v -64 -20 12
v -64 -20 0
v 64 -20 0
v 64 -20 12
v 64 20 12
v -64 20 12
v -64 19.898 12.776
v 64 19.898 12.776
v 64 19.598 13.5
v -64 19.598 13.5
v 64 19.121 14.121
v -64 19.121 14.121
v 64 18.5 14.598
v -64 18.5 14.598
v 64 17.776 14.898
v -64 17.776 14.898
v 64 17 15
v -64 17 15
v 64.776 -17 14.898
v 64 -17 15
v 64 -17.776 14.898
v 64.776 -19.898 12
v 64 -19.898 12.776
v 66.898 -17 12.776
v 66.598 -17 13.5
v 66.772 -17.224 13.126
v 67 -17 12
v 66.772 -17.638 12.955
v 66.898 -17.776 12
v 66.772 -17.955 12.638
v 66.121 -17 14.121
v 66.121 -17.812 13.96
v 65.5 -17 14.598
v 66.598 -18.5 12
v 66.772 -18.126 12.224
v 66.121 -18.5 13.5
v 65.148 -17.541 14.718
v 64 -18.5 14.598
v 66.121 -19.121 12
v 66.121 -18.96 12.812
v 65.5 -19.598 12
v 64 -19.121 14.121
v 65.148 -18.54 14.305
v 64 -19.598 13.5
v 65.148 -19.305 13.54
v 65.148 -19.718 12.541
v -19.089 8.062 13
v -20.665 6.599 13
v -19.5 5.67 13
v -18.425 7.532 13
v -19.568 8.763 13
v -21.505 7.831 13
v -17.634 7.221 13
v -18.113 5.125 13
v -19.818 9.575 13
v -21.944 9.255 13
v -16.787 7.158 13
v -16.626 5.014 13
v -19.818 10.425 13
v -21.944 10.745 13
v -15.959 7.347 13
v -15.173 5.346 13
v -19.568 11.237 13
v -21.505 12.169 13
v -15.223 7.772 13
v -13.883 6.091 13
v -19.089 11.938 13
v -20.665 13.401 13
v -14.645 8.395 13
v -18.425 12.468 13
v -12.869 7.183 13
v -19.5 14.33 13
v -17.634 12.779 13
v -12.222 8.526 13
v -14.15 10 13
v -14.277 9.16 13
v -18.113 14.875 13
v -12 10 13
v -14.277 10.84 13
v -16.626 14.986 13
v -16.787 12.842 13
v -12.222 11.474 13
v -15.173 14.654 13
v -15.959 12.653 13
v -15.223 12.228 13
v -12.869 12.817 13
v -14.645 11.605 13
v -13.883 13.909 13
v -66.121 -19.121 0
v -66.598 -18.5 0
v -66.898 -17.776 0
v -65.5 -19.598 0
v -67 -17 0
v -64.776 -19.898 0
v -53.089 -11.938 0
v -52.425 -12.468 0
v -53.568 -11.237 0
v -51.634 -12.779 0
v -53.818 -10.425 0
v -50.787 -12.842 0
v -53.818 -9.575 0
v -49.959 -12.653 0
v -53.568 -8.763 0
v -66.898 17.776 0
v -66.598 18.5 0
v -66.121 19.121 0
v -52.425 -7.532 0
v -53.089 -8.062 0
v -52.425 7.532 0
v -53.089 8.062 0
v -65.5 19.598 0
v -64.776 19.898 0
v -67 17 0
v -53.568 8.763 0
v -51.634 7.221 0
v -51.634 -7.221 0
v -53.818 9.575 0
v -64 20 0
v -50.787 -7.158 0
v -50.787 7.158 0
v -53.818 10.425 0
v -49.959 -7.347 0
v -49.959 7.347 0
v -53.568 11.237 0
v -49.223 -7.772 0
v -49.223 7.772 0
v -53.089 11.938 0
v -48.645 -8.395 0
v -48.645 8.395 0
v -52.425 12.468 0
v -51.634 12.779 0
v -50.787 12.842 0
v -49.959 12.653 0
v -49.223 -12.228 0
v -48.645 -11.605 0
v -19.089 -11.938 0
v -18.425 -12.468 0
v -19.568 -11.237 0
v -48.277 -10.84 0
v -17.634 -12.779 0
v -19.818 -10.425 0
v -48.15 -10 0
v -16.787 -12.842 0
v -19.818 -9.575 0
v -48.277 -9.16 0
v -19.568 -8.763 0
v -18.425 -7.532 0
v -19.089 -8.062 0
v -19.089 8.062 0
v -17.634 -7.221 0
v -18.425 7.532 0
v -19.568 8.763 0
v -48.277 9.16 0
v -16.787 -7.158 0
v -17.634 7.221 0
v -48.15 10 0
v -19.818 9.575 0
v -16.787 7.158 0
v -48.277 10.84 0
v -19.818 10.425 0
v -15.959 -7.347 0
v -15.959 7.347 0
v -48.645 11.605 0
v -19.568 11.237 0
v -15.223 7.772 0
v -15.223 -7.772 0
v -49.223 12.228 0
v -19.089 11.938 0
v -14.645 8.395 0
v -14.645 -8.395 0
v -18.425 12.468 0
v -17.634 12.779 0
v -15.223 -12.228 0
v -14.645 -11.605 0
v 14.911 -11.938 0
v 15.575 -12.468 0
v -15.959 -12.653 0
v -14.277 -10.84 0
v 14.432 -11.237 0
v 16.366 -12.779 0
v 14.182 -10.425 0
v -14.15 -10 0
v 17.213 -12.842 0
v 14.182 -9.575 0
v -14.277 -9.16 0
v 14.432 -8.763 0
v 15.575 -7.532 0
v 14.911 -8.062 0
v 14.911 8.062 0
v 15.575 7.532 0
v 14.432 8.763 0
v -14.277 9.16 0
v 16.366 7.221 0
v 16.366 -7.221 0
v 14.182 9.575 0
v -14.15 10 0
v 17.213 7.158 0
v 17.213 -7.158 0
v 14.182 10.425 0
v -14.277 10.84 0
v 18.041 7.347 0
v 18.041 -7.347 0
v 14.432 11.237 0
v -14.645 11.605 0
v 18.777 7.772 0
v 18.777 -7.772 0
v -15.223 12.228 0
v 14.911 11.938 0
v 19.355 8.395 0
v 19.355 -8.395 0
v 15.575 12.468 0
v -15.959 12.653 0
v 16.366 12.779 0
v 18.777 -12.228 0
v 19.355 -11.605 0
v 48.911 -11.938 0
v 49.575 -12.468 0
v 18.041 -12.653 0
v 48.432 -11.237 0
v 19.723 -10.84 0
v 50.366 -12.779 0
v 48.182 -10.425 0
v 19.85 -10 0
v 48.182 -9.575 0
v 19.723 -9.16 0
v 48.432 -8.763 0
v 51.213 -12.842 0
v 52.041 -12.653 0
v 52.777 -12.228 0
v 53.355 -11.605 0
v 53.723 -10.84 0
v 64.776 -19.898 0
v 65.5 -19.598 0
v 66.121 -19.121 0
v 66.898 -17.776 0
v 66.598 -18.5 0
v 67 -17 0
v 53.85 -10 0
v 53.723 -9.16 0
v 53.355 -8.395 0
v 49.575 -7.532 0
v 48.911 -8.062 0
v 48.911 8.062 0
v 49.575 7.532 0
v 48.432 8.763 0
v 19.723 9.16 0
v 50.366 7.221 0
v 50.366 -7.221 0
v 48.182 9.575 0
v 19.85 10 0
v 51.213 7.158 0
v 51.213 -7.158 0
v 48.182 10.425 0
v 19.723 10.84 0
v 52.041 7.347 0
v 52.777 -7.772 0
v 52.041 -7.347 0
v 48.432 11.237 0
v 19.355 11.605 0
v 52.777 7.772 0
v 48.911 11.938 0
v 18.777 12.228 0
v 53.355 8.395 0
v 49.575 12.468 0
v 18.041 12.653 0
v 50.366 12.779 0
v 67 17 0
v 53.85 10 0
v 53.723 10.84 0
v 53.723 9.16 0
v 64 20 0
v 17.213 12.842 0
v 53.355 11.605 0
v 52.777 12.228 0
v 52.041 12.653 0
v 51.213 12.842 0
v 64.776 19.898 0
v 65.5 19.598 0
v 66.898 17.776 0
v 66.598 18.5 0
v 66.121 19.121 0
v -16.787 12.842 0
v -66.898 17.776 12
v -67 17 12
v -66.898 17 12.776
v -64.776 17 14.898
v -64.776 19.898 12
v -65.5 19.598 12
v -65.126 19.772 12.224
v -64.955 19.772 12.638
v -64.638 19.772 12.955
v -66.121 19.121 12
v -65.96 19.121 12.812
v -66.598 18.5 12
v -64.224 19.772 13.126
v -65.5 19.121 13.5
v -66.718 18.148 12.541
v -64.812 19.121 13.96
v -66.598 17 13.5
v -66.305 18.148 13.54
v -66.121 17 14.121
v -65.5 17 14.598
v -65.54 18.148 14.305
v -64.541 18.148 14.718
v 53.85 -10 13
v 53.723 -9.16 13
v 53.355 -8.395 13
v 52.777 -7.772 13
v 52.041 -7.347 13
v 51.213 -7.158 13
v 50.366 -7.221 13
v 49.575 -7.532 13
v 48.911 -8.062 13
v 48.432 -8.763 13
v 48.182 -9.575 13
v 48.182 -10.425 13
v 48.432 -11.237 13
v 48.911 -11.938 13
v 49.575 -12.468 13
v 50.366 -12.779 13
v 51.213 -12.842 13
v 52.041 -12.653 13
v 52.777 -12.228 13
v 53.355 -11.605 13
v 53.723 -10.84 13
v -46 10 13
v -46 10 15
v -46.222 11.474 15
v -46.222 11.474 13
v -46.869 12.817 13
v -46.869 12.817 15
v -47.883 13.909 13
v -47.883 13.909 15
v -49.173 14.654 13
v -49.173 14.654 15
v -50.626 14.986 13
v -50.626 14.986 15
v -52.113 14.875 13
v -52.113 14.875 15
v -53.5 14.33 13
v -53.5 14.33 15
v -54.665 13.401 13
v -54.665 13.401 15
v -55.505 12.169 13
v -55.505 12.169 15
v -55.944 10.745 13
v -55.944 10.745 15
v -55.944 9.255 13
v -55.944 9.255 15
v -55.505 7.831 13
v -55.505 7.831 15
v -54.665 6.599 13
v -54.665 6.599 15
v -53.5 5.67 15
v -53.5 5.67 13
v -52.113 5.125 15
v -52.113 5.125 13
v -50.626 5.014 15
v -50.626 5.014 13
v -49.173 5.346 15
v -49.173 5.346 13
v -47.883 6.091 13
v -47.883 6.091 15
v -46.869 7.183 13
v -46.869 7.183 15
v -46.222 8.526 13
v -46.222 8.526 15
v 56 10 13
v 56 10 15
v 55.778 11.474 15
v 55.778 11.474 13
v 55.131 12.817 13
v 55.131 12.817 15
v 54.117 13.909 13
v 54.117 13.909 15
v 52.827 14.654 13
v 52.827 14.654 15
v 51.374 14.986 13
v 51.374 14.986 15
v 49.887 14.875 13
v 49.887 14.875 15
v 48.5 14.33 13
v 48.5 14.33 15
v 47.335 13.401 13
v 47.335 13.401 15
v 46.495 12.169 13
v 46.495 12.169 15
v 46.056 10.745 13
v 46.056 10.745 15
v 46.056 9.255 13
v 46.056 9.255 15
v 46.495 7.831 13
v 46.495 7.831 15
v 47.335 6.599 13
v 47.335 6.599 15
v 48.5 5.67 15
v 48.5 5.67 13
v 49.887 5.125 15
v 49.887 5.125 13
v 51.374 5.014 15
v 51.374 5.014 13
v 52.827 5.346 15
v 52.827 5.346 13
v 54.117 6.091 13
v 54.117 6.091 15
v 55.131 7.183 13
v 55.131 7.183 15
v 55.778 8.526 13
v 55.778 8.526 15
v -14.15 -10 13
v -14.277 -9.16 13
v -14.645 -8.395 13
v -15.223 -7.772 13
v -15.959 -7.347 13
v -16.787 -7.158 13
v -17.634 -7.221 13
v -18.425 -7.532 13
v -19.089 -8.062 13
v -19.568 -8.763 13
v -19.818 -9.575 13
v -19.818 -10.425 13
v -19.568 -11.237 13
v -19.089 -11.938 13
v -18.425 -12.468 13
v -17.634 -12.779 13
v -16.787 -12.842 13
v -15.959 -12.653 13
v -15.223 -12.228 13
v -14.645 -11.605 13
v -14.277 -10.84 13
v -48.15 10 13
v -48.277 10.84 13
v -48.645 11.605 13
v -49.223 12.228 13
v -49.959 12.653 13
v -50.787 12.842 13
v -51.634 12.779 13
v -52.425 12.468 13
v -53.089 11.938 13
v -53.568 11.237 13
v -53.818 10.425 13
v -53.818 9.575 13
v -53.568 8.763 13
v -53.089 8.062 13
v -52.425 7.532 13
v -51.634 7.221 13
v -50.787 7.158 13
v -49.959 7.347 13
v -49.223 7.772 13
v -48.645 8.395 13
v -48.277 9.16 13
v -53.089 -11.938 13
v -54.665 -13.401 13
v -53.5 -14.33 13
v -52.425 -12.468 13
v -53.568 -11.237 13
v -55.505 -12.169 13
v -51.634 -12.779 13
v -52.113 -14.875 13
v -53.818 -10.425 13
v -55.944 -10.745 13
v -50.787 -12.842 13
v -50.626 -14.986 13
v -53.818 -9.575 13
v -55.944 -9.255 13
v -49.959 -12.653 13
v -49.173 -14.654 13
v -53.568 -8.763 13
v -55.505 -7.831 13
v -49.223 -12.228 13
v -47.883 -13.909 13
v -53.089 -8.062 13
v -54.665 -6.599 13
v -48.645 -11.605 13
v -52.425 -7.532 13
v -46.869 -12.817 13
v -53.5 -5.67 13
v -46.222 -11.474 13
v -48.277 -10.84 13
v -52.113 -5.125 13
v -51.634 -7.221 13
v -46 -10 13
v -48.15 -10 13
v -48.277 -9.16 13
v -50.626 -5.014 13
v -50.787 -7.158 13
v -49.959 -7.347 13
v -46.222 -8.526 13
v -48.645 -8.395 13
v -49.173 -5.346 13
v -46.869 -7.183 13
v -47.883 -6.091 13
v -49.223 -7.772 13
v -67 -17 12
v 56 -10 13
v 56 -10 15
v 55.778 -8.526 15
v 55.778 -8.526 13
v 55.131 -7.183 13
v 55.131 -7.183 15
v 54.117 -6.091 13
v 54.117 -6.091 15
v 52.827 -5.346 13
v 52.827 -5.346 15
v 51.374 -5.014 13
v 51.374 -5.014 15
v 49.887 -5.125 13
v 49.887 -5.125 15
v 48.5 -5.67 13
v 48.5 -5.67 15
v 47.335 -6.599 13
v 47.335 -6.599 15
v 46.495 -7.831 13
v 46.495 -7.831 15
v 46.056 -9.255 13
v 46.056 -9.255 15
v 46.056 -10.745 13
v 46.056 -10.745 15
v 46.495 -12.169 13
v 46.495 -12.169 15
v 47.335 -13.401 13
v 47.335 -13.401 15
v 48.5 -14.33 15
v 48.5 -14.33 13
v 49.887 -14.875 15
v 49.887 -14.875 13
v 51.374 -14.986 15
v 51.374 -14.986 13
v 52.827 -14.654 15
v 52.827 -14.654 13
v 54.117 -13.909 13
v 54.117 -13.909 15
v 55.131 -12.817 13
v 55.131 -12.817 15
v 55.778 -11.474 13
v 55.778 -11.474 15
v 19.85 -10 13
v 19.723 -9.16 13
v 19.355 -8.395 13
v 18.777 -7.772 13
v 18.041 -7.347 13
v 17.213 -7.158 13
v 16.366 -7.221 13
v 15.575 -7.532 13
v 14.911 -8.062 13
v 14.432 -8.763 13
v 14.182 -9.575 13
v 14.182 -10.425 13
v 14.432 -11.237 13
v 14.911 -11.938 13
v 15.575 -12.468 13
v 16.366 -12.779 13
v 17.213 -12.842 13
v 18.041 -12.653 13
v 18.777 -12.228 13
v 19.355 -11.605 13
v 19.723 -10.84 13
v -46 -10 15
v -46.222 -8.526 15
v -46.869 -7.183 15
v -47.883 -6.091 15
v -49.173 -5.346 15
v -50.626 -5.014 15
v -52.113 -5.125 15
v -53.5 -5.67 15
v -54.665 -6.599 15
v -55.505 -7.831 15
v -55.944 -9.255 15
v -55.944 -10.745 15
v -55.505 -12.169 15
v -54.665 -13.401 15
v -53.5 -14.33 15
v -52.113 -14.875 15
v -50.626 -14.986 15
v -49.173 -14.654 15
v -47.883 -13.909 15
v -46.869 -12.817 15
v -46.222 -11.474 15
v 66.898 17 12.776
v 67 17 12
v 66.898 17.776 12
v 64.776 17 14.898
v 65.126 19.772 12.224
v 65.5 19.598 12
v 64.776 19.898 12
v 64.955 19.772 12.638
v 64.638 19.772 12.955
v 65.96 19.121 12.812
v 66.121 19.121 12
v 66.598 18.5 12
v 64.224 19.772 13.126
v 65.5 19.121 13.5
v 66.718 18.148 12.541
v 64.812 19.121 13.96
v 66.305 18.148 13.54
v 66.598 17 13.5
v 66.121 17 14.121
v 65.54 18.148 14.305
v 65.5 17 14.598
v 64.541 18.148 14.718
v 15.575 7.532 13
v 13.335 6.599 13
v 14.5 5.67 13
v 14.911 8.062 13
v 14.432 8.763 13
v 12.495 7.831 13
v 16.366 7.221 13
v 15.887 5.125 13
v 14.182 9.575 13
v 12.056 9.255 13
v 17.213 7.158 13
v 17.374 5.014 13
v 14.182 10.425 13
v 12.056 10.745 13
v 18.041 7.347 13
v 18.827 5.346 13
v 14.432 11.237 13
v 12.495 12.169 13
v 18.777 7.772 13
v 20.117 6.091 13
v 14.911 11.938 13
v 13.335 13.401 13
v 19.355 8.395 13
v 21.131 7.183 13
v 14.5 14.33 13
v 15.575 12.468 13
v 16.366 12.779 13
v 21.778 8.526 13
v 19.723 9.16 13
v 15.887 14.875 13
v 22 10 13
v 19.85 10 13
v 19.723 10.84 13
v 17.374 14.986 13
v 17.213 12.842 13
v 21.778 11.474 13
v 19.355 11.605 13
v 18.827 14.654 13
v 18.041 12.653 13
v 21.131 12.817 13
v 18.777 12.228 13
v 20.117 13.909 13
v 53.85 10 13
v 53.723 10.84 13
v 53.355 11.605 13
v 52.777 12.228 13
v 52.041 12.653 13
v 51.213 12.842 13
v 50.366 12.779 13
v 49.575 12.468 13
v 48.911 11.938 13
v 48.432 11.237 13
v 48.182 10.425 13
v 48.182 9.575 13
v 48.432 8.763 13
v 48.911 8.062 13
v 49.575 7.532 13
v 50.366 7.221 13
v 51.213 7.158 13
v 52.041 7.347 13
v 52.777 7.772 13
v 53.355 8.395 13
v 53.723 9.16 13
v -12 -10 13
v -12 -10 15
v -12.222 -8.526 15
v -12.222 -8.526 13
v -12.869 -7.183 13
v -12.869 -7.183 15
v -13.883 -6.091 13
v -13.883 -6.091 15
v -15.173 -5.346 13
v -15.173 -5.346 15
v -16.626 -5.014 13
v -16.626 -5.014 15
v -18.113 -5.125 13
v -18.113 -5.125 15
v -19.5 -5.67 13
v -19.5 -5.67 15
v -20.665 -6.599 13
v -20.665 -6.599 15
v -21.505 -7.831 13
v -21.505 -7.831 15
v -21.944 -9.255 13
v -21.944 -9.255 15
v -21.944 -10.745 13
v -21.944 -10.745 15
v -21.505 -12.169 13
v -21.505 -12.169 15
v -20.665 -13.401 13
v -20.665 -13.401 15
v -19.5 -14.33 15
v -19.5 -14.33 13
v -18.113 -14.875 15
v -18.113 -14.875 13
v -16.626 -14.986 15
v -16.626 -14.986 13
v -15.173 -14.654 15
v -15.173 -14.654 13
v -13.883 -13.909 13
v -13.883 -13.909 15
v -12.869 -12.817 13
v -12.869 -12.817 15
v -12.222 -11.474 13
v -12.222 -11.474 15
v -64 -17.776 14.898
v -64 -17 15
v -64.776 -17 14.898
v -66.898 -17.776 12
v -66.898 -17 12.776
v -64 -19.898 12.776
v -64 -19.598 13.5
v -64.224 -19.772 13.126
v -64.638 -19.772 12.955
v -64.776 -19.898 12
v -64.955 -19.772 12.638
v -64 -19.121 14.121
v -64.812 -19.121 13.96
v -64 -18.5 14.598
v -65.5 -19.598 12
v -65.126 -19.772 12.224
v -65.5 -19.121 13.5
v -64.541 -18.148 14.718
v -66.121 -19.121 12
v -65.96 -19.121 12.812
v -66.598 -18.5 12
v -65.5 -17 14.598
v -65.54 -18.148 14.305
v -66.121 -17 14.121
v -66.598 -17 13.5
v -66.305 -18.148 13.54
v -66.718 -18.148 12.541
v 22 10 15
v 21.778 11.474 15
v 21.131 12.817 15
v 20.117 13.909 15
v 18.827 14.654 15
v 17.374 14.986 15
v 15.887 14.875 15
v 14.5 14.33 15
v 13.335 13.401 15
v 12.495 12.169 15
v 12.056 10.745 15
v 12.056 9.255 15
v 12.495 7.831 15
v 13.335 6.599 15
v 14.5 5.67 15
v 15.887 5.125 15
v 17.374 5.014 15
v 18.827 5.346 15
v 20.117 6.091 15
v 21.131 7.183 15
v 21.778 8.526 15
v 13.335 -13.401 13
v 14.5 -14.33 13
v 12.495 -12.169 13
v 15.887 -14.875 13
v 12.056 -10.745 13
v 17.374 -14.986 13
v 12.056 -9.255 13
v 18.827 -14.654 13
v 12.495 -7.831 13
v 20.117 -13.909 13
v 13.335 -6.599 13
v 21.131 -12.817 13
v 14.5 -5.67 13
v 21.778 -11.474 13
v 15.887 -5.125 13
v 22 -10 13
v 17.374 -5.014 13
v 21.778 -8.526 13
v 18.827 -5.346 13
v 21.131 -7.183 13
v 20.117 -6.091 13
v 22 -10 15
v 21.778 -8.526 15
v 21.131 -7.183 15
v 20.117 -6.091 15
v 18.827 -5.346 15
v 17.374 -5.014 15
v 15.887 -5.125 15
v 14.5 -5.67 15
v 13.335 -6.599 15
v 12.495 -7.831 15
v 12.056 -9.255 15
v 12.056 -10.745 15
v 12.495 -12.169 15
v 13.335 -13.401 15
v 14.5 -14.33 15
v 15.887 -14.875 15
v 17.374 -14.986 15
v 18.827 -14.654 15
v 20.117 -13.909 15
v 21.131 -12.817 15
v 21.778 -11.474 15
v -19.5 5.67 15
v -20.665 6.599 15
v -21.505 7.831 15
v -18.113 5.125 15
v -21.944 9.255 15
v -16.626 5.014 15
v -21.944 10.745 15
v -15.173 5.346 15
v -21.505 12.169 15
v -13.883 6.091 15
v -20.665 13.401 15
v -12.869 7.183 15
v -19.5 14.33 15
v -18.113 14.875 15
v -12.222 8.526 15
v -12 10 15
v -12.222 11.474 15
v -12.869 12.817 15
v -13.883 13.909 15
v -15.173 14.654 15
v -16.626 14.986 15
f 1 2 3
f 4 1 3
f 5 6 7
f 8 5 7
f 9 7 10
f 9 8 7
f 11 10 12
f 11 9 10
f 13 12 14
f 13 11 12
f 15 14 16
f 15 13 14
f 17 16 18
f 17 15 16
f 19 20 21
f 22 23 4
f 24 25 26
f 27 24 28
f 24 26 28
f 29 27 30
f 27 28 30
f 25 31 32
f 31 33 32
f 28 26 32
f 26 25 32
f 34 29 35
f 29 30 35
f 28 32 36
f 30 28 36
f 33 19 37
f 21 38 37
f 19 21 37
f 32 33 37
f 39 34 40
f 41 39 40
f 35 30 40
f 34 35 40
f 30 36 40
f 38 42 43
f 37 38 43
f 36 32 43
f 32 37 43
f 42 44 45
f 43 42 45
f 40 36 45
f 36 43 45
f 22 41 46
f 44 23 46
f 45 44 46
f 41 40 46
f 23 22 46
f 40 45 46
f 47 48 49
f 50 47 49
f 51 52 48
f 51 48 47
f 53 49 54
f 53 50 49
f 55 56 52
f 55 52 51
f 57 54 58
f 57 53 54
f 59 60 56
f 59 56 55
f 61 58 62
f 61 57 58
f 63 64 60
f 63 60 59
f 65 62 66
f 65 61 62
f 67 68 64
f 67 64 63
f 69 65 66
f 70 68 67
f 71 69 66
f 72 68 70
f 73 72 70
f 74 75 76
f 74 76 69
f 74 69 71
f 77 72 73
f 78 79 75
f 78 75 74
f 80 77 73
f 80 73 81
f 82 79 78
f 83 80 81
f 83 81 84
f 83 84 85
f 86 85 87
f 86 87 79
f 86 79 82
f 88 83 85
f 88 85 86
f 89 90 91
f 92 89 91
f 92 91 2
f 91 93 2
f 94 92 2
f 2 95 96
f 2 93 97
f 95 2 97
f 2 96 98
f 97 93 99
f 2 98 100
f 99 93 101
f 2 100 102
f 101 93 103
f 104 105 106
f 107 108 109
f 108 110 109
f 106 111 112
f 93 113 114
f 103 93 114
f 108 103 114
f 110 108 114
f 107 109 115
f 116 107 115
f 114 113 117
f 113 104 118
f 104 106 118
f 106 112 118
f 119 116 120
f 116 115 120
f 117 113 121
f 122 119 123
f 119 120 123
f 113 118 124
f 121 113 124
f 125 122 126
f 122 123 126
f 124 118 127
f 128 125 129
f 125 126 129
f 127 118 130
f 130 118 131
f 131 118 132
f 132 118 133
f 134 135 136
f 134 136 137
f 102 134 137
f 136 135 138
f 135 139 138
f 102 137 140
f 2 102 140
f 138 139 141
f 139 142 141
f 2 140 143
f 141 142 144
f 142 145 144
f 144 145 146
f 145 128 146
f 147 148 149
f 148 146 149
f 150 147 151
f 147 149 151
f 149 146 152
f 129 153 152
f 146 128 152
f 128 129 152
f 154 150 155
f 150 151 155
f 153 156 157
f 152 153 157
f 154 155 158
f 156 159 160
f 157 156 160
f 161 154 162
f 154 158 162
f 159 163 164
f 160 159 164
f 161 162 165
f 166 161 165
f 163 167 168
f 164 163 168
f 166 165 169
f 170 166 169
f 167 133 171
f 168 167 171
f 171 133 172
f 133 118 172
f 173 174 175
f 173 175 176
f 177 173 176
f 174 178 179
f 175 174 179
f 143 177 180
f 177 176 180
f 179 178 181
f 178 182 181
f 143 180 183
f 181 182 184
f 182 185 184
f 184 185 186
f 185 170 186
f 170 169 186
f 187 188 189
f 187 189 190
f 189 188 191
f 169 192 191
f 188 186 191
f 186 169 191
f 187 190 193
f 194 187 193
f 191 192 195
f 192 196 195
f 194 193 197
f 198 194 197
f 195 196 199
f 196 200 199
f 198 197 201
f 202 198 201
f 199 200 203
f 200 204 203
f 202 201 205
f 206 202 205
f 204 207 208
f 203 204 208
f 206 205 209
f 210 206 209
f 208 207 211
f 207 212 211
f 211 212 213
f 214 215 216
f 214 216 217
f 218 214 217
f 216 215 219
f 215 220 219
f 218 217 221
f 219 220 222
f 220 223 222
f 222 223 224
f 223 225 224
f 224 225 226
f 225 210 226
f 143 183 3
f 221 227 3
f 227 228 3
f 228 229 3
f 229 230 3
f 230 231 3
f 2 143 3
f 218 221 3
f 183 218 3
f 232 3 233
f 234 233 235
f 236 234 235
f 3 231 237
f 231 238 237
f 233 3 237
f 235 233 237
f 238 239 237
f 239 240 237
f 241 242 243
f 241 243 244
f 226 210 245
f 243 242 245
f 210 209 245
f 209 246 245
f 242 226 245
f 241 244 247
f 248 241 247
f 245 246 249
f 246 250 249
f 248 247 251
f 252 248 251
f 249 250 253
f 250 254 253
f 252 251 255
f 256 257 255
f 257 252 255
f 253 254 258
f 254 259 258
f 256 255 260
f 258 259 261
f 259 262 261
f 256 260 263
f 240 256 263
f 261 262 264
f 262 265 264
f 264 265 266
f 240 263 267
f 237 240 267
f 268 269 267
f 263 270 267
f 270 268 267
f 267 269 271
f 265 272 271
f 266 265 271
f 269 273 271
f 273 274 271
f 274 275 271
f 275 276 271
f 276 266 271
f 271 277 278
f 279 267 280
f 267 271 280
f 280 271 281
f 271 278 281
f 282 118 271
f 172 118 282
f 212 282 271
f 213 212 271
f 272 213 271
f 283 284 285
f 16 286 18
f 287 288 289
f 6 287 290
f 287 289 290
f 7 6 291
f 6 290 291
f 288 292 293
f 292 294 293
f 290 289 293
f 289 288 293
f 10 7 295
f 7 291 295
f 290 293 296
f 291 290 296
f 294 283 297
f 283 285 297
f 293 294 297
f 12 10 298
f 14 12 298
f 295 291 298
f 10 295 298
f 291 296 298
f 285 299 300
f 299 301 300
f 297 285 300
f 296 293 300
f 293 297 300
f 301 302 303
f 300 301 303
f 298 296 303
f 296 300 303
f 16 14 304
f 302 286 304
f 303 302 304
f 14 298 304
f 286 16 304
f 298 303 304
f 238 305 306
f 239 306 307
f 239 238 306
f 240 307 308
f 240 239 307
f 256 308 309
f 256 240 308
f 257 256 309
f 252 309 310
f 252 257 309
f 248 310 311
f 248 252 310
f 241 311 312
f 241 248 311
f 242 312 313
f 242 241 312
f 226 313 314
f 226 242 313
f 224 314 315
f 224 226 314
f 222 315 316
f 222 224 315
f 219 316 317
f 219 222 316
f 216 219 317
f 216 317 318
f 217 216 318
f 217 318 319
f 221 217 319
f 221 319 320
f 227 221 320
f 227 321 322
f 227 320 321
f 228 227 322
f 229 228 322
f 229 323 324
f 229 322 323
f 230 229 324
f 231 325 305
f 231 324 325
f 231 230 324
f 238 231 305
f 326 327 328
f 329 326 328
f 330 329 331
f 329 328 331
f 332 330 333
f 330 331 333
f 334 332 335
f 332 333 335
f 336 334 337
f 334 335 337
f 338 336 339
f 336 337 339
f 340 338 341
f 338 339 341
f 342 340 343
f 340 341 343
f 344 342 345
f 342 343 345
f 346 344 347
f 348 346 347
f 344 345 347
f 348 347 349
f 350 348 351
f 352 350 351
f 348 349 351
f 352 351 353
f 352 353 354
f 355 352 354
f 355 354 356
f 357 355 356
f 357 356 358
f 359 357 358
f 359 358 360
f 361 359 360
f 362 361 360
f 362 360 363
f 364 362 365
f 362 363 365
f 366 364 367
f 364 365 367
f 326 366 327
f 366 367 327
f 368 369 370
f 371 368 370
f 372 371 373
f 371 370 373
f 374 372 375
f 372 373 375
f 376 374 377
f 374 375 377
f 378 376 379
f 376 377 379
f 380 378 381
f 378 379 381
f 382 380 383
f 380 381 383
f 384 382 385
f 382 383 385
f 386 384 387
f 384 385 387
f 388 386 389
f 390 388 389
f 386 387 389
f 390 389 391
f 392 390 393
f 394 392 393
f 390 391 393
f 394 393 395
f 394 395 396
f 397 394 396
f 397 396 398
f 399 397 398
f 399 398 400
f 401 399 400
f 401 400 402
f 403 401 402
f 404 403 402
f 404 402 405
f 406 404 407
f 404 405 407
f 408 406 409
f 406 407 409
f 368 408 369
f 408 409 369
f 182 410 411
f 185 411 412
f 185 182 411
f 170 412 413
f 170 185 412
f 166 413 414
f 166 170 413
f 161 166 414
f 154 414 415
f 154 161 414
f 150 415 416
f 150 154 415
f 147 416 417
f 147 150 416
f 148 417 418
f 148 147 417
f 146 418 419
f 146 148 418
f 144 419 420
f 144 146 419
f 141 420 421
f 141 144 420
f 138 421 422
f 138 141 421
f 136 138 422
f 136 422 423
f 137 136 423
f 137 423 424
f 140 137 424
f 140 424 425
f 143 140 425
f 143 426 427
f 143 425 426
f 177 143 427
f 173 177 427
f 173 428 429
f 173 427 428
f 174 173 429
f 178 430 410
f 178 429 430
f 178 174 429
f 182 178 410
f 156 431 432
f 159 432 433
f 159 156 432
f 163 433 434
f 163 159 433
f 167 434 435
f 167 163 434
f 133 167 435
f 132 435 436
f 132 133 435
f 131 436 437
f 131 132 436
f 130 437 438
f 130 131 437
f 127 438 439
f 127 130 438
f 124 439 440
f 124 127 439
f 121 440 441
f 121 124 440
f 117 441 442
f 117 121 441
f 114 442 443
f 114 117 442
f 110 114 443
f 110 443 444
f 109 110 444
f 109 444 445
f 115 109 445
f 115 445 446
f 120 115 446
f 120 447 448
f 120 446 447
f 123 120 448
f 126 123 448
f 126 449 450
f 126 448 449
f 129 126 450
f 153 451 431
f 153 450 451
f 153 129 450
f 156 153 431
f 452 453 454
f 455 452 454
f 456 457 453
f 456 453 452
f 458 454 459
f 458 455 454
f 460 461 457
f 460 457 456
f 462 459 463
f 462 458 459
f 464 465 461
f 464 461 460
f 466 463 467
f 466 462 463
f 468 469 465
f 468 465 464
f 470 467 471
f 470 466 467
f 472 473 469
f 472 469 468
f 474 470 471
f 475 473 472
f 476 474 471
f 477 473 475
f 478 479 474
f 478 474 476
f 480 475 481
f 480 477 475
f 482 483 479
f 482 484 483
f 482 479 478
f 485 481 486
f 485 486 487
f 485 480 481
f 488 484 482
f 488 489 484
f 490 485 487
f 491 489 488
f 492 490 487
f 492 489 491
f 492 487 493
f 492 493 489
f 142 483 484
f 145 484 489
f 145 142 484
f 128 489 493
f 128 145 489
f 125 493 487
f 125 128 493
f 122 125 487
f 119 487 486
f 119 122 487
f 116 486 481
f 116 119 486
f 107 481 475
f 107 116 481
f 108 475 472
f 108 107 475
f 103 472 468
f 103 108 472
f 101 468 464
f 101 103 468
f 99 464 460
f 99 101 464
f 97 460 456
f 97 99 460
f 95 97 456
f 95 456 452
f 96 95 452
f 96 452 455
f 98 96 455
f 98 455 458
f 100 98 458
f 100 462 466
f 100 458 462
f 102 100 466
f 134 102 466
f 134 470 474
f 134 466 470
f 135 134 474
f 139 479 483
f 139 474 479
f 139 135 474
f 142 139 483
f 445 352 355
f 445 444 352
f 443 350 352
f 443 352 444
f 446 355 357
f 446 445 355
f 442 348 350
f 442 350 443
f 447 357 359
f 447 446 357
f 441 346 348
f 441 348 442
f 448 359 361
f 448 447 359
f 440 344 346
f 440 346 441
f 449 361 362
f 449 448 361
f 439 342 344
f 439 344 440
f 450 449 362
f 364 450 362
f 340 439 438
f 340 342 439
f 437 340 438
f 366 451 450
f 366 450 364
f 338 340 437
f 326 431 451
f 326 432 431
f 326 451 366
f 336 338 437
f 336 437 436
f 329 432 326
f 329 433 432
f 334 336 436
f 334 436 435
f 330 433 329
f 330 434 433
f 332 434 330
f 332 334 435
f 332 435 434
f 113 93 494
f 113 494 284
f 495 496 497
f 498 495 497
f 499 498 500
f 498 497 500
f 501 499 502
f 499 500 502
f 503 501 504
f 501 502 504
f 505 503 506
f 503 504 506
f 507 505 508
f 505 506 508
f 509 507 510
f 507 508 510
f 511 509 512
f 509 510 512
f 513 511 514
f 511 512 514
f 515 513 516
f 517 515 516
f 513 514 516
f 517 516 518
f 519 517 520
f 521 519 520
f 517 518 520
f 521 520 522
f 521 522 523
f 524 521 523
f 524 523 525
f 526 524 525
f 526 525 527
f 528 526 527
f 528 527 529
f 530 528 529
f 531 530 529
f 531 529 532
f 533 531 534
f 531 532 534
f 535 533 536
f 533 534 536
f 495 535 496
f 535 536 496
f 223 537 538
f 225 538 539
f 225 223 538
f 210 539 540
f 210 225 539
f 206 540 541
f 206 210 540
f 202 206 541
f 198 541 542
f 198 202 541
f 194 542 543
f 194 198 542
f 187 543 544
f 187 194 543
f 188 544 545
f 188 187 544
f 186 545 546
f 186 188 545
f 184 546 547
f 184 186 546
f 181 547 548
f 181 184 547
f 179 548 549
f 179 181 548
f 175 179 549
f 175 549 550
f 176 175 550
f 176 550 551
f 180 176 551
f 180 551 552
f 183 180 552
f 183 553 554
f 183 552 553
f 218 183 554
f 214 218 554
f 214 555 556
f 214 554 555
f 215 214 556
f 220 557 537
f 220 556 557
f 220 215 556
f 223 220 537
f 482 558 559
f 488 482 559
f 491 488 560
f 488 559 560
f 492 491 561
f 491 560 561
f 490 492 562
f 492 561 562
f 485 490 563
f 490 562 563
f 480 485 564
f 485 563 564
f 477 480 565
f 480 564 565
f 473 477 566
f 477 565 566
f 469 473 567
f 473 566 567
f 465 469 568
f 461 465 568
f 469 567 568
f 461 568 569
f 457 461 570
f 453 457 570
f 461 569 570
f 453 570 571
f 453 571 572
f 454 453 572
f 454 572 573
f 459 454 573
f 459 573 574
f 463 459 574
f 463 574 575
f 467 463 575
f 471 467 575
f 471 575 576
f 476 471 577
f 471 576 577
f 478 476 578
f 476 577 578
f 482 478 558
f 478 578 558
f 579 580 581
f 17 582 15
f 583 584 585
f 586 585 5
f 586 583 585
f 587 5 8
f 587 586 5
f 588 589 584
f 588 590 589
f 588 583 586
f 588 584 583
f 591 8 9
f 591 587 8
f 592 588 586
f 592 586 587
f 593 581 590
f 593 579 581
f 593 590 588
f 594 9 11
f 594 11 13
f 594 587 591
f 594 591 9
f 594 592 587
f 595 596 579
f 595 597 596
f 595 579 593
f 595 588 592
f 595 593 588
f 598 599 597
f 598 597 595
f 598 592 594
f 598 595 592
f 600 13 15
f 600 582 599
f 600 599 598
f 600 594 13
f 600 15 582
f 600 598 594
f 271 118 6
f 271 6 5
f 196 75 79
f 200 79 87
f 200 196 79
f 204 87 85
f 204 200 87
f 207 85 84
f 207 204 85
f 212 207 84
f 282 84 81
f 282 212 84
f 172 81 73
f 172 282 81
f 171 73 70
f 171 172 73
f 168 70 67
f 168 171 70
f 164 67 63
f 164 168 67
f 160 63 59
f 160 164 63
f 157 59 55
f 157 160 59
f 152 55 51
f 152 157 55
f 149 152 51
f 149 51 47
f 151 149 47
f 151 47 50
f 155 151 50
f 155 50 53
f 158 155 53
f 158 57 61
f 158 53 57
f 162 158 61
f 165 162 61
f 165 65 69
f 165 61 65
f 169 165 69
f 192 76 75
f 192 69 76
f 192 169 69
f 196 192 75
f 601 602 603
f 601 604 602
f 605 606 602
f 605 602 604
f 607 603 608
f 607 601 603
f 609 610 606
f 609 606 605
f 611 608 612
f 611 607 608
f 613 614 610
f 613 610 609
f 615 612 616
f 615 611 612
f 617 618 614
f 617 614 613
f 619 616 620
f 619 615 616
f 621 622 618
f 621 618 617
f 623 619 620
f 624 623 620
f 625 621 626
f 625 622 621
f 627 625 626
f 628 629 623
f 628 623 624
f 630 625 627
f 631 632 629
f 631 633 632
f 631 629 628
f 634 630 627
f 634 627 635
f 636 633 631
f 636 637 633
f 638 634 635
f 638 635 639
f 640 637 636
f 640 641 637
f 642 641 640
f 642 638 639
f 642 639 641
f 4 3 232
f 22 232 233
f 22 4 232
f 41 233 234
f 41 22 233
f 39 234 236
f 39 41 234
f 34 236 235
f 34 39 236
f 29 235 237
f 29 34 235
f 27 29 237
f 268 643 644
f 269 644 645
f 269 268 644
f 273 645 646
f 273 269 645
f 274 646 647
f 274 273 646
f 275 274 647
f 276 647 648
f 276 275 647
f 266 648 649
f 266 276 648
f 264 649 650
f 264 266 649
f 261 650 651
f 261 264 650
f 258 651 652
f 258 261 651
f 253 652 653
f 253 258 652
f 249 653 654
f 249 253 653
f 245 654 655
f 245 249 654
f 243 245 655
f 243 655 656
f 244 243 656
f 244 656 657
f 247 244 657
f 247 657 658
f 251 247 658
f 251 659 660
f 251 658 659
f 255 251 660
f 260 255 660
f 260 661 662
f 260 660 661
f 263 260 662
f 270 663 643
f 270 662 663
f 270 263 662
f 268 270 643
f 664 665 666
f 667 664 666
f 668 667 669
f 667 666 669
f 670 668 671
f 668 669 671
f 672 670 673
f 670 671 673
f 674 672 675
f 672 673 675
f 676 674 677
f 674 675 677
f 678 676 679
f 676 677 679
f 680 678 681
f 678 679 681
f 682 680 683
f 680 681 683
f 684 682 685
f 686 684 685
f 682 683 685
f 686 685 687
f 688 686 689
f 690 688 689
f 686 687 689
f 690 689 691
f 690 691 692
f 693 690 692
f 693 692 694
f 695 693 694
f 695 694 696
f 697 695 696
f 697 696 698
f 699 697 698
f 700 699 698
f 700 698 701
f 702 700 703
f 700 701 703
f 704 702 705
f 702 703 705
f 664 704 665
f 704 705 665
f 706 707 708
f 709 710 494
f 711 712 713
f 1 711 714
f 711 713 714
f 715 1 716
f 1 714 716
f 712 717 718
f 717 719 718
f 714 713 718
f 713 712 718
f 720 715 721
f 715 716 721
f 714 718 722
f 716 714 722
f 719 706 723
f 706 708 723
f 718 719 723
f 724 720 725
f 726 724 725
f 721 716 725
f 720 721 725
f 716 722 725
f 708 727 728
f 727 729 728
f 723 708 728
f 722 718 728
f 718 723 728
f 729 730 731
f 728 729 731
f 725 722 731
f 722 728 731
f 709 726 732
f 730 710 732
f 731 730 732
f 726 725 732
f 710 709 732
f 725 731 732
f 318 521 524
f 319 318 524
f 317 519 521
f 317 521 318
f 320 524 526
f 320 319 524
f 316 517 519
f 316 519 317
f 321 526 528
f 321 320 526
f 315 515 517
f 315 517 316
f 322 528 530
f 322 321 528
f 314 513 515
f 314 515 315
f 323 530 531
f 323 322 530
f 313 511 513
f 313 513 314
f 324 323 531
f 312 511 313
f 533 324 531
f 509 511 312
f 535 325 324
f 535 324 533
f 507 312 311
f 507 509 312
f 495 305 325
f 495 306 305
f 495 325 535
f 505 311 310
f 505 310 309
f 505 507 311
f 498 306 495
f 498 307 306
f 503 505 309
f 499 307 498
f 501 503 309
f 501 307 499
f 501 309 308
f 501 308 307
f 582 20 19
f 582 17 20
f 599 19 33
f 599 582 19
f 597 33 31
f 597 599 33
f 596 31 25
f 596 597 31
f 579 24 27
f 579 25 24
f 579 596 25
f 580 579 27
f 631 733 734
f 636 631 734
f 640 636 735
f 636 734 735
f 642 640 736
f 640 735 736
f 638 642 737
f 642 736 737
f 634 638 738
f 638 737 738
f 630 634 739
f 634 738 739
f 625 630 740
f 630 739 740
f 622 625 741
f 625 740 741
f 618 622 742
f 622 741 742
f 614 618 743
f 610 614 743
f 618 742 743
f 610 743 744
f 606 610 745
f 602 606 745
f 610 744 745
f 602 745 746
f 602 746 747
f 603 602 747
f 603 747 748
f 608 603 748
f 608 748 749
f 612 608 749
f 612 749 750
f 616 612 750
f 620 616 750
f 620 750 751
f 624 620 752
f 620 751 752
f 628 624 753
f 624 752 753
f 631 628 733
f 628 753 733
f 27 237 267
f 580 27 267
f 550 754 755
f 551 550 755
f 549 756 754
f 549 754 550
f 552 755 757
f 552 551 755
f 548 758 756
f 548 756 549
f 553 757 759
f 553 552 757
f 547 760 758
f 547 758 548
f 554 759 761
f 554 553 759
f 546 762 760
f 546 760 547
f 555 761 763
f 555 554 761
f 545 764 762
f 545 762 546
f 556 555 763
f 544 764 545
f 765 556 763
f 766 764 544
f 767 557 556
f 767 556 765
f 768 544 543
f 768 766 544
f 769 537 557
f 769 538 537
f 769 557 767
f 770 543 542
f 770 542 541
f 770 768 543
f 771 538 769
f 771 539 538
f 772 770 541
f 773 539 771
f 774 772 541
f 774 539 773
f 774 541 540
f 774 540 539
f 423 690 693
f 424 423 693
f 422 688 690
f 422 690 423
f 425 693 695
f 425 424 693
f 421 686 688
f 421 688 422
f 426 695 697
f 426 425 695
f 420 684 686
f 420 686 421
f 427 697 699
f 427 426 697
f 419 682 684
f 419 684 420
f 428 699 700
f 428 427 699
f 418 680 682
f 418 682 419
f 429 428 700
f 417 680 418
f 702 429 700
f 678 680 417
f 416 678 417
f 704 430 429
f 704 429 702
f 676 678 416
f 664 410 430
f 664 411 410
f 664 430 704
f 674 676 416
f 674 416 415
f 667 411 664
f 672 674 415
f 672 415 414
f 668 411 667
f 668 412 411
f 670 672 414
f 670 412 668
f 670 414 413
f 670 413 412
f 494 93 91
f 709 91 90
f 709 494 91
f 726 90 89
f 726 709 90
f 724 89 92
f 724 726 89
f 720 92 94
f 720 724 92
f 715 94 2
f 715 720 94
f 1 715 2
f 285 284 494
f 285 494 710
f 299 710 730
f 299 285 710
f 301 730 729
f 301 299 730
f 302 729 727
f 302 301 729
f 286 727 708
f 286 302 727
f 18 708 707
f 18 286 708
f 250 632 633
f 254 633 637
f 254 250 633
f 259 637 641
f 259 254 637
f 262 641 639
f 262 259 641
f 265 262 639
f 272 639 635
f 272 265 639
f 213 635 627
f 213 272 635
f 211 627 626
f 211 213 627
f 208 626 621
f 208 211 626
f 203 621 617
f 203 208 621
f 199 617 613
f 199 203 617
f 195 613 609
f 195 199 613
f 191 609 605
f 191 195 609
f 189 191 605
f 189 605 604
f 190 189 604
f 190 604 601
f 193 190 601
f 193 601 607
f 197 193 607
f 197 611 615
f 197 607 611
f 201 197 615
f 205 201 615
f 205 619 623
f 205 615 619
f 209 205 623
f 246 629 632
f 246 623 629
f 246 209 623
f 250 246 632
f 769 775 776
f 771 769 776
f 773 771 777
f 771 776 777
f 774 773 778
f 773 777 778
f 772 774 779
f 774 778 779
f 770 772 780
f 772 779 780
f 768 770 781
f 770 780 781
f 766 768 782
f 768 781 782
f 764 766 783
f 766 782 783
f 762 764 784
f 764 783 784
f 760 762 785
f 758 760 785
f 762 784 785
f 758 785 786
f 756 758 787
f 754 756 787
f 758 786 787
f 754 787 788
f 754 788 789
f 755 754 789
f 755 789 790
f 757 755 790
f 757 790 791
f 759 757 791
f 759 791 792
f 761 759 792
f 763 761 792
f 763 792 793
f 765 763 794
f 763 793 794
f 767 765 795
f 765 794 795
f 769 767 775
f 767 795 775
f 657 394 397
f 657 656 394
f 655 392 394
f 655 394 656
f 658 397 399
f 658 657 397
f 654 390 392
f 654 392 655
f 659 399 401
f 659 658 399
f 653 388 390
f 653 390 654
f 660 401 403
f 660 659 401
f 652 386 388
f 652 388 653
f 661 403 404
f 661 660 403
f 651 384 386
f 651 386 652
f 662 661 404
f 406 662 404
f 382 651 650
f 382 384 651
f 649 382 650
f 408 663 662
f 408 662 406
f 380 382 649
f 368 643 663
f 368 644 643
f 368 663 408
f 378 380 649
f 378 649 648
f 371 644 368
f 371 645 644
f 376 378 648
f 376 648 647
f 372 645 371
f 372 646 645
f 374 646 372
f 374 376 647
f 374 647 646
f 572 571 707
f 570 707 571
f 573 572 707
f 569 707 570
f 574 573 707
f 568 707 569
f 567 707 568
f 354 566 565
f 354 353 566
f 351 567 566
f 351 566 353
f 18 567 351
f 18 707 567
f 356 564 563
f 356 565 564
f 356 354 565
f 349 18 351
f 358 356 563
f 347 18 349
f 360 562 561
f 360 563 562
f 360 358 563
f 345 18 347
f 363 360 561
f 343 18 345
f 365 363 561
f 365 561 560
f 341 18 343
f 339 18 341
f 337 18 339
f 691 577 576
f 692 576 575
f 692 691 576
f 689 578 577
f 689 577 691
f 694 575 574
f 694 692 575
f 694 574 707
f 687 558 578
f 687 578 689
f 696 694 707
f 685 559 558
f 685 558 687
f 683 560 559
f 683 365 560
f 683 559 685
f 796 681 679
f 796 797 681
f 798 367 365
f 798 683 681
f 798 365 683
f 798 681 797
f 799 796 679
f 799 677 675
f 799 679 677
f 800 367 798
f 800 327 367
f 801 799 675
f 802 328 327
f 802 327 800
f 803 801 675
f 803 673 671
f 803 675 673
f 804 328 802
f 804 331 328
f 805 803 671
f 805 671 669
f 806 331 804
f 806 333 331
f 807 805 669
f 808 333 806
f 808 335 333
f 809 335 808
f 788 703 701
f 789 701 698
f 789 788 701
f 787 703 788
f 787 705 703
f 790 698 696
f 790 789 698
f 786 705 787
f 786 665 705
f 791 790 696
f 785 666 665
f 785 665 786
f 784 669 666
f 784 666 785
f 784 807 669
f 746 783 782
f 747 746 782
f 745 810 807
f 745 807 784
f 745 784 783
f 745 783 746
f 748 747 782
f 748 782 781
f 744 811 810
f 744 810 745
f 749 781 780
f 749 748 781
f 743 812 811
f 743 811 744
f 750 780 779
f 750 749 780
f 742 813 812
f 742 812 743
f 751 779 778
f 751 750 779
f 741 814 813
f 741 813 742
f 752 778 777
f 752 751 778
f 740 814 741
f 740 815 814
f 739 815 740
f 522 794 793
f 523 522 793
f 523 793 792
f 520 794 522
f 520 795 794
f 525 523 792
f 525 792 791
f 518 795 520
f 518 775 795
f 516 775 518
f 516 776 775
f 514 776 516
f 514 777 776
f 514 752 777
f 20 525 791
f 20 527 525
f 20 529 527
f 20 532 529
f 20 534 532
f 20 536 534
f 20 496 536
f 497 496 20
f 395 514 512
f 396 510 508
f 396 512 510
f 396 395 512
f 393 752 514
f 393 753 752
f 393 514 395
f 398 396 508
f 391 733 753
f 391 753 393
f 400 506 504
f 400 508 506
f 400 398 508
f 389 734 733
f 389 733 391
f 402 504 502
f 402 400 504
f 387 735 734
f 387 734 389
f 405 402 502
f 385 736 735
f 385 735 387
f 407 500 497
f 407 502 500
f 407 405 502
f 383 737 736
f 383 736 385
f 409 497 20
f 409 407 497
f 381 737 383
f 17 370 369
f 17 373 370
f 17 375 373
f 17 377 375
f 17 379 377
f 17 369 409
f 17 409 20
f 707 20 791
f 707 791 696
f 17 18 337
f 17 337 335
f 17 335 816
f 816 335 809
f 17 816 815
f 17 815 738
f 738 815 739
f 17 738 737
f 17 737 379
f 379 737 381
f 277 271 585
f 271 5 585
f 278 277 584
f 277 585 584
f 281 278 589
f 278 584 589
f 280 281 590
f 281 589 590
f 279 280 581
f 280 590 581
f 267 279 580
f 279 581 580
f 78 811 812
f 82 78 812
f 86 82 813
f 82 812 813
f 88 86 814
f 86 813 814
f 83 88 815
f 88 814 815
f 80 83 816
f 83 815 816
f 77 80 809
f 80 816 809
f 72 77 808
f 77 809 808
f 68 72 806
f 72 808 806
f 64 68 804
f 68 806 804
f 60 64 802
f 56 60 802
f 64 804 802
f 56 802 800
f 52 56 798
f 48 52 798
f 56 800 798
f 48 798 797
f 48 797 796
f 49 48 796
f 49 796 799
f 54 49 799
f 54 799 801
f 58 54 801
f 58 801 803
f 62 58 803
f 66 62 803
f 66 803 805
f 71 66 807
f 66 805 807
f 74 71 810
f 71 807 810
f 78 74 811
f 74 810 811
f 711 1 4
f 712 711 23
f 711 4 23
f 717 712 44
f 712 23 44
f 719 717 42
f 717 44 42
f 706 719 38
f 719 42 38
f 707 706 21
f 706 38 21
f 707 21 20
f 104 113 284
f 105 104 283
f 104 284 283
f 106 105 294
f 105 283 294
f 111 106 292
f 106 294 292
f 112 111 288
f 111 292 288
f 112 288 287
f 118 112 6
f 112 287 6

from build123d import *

# Parameters (mm, degrees)
SKETCH1_W           = 134
SKETCH1_H           = 40
SKETCH1_R           = 2.85
BOSS_EXTRUDE1_DEPTH = 15
SKETCH2_R           = 5
CUT_EXTRUDE1_DEPTH  = 2
FILLET1_R           = 3


with BuildPart() as part:
    # Sketch1 → Boss-Extrude1 (new body)
    with BuildSketch(Plane.XY):
        Rectangle(SKETCH1_W, SKETCH1_H)
        with Locations((-51, 10)):
            Circle(SKETCH1_R, mode=Mode.SUBTRACT)
        with Locations((-17, 10)):
            Circle(SKETCH1_R, mode=Mode.SUBTRACT)
        with Locations((17, 10)):
            Circle(SKETCH1_R, mode=Mode.SUBTRACT)
        with Locations((51, 10)):
            Circle(SKETCH1_R, mode=Mode.SUBTRACT)
        with Locations((-17, -10)):
            Circle(SKETCH1_R, mode=Mode.SUBTRACT)
        with Locations((17, -10)):
            Circle(SKETCH1_R, mode=Mode.SUBTRACT)
        with Locations((51, -10)):
            Circle(SKETCH1_R, mode=Mode.SUBTRACT)
        with Locations((-51, -10)):
            Circle(SKETCH1_R, mode=Mode.SUBTRACT)
    extrude(amount=BOSS_EXTRUDE1_DEPTH)

    # Sketch2 → Cut-Extrude1 (cut)
    with BuildSketch(Plane.XY.offset(15)):
        with Locations((-51, 10)):
            Circle(SKETCH2_R)
        with Locations((-17, 10)):
            Circle(SKETCH2_R)
        with Locations((17, 10)):
            Circle(SKETCH2_R)
        with Locations((51, 10)):
            Circle(SKETCH2_R)
        with Locations((-17, -10)):
            Circle(SKETCH2_R)
        with Locations((17, -10)):
            Circle(SKETCH2_R)
        with Locations((51, -10)):
            Circle(SKETCH2_R)
        with Locations((-51, -10)):
            Circle(SKETCH2_R)
    extrude(amount=-CUT_EXTRUDE1_DEPTH, mode=Mode.SUBTRACT)

    # Fillet1
    fillet1_edges = [part.edges().sort_by_distance(p)[0] for p in [
        (-67, 0, 15),
        (0, -20, 15),
        (67, 0, 15),
        (67, -20, 7.5),
        (-67, -20, 7.5),
        (-67, 20, 7.5),
        (67, 20, 7.5),
        (0, 20, 15),
    ]]
    fillet(fillet1_edges, radius=FILLET1_R)


solid = part.part
